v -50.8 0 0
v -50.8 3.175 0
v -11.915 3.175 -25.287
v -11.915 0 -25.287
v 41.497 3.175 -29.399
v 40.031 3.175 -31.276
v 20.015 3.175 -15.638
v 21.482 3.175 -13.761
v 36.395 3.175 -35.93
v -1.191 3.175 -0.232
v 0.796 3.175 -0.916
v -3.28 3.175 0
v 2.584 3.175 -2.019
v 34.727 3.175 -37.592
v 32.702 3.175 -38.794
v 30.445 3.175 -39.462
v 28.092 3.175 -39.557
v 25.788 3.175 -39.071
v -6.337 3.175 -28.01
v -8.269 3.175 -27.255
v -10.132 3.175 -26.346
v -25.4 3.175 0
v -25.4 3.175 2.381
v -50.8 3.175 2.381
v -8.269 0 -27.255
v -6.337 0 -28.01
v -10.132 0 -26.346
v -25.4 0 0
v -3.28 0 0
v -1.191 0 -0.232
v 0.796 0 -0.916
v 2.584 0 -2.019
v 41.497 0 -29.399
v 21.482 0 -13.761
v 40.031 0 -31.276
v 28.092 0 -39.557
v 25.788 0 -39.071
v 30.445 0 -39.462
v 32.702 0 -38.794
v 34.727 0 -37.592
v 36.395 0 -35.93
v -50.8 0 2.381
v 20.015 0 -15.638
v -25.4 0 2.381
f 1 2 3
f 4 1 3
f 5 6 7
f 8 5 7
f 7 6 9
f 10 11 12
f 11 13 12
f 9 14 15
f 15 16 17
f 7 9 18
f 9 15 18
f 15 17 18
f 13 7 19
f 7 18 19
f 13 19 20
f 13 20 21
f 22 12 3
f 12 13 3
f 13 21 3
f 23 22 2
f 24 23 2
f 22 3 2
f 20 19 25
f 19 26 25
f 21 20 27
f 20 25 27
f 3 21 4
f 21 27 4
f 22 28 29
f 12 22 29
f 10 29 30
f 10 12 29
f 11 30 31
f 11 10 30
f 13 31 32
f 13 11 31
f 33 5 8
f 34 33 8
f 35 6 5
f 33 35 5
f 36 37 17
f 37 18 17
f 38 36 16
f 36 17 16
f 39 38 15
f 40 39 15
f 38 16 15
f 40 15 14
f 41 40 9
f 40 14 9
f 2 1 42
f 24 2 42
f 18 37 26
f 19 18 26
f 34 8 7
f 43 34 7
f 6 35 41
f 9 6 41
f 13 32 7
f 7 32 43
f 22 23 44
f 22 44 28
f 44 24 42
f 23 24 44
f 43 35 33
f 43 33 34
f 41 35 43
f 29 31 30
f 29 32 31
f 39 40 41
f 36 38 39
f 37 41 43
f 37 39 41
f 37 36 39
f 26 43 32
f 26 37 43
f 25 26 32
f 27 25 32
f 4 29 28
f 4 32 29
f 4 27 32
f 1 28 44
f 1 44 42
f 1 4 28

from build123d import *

# Parameters (mm, degrees)
BOSS_EXTRUDE1_DEPTH = 3.175
SKETCH2_W           = 25.4
SKETCH2_H           = 2.38125
BOSS_EXTRUDE2_DEPTH = 3.175
FILLET1_R           = 9.525
CUT_EXTRUDE1_DEPTH  = 4.175
FILLET2_R           = 25.4


with BuildPart() as part:
    # Sketch1 → Boss-Extrude1 (new body)
    with BuildSketch(Plane(origin=(0, 0, 0), x_dir=(1, 0, 0), z_dir=(0, 1, 0))):
        Polygon((-50.8, 0), (0, 0), (40.030946283, 31.275602947), (32.212045547, 41.283339517), (-50.8, 12.7), align=None)
    extrude(amount=BOSS_EXTRUDE1_DEPTH)

    # Sketch2 → Boss-Extrude2 (add)
    with BuildSketch(Plane(origin=(0, 3.175, 0), x_dir=(1, 0, 0), z_dir=(0, 1, 0))):
        Polygon((20.015473142, 15.637801473), (40.030946283, 31.275602947), (41.496990171, 29.39915234), (21.48151703, 13.761350866), align=None)
        with Locations((-38.1, -1.190625)):
            Rectangle(SKETCH2_W, SKETCH2_H)
    extrude(amount=-BOSS_EXTRUDE2_DEPTH)

    # Fillet1
    fillet1_edges = [part.edges().sort_by_distance(p)[0] for p in [
        (-50.8, 1.5875, -12.7),
        (32.212045547, 1.5875, -41.283339517),
        (0, 1.5875, 0),
    ]]
    fillet(fillet1_edges, radius=FILLET1_R)

    # Sketch3 → Cut-Extrude1 (cut, through all)
    with BuildSketch(Plane(origin=(0, 3.175, 0), x_dir=(1, 0, 0), z_dir=(0, 1, 0))):
        with BuildLine():
            Line((-50.8, 0), (-9.293977227, 26.991669759))
            Line((-9.293977227, 26.991669759), (-44.376036671, 14.911947961))
            ThreePointArc((-44.376036671, 14.911947961), (-49.029450312, 11.437079181), (-50.8, 5.905883528))
            Line((-50.8, 5.905883528), (-50.8, 0))
        make_face()
    extrude(amount=-CUT_EXTRUDE1_DEPTH, mode=Mode.SUBTRACT)

    # Fillet2
    fillet2_edges = [part.edges().sort_by_distance(p)[0] for p in [
        (-9.293977227, 1.5875, -26.991669759),
    ]]
    fillet(fillet2_edges, radius=FILLET2_R)


solid = part.part
